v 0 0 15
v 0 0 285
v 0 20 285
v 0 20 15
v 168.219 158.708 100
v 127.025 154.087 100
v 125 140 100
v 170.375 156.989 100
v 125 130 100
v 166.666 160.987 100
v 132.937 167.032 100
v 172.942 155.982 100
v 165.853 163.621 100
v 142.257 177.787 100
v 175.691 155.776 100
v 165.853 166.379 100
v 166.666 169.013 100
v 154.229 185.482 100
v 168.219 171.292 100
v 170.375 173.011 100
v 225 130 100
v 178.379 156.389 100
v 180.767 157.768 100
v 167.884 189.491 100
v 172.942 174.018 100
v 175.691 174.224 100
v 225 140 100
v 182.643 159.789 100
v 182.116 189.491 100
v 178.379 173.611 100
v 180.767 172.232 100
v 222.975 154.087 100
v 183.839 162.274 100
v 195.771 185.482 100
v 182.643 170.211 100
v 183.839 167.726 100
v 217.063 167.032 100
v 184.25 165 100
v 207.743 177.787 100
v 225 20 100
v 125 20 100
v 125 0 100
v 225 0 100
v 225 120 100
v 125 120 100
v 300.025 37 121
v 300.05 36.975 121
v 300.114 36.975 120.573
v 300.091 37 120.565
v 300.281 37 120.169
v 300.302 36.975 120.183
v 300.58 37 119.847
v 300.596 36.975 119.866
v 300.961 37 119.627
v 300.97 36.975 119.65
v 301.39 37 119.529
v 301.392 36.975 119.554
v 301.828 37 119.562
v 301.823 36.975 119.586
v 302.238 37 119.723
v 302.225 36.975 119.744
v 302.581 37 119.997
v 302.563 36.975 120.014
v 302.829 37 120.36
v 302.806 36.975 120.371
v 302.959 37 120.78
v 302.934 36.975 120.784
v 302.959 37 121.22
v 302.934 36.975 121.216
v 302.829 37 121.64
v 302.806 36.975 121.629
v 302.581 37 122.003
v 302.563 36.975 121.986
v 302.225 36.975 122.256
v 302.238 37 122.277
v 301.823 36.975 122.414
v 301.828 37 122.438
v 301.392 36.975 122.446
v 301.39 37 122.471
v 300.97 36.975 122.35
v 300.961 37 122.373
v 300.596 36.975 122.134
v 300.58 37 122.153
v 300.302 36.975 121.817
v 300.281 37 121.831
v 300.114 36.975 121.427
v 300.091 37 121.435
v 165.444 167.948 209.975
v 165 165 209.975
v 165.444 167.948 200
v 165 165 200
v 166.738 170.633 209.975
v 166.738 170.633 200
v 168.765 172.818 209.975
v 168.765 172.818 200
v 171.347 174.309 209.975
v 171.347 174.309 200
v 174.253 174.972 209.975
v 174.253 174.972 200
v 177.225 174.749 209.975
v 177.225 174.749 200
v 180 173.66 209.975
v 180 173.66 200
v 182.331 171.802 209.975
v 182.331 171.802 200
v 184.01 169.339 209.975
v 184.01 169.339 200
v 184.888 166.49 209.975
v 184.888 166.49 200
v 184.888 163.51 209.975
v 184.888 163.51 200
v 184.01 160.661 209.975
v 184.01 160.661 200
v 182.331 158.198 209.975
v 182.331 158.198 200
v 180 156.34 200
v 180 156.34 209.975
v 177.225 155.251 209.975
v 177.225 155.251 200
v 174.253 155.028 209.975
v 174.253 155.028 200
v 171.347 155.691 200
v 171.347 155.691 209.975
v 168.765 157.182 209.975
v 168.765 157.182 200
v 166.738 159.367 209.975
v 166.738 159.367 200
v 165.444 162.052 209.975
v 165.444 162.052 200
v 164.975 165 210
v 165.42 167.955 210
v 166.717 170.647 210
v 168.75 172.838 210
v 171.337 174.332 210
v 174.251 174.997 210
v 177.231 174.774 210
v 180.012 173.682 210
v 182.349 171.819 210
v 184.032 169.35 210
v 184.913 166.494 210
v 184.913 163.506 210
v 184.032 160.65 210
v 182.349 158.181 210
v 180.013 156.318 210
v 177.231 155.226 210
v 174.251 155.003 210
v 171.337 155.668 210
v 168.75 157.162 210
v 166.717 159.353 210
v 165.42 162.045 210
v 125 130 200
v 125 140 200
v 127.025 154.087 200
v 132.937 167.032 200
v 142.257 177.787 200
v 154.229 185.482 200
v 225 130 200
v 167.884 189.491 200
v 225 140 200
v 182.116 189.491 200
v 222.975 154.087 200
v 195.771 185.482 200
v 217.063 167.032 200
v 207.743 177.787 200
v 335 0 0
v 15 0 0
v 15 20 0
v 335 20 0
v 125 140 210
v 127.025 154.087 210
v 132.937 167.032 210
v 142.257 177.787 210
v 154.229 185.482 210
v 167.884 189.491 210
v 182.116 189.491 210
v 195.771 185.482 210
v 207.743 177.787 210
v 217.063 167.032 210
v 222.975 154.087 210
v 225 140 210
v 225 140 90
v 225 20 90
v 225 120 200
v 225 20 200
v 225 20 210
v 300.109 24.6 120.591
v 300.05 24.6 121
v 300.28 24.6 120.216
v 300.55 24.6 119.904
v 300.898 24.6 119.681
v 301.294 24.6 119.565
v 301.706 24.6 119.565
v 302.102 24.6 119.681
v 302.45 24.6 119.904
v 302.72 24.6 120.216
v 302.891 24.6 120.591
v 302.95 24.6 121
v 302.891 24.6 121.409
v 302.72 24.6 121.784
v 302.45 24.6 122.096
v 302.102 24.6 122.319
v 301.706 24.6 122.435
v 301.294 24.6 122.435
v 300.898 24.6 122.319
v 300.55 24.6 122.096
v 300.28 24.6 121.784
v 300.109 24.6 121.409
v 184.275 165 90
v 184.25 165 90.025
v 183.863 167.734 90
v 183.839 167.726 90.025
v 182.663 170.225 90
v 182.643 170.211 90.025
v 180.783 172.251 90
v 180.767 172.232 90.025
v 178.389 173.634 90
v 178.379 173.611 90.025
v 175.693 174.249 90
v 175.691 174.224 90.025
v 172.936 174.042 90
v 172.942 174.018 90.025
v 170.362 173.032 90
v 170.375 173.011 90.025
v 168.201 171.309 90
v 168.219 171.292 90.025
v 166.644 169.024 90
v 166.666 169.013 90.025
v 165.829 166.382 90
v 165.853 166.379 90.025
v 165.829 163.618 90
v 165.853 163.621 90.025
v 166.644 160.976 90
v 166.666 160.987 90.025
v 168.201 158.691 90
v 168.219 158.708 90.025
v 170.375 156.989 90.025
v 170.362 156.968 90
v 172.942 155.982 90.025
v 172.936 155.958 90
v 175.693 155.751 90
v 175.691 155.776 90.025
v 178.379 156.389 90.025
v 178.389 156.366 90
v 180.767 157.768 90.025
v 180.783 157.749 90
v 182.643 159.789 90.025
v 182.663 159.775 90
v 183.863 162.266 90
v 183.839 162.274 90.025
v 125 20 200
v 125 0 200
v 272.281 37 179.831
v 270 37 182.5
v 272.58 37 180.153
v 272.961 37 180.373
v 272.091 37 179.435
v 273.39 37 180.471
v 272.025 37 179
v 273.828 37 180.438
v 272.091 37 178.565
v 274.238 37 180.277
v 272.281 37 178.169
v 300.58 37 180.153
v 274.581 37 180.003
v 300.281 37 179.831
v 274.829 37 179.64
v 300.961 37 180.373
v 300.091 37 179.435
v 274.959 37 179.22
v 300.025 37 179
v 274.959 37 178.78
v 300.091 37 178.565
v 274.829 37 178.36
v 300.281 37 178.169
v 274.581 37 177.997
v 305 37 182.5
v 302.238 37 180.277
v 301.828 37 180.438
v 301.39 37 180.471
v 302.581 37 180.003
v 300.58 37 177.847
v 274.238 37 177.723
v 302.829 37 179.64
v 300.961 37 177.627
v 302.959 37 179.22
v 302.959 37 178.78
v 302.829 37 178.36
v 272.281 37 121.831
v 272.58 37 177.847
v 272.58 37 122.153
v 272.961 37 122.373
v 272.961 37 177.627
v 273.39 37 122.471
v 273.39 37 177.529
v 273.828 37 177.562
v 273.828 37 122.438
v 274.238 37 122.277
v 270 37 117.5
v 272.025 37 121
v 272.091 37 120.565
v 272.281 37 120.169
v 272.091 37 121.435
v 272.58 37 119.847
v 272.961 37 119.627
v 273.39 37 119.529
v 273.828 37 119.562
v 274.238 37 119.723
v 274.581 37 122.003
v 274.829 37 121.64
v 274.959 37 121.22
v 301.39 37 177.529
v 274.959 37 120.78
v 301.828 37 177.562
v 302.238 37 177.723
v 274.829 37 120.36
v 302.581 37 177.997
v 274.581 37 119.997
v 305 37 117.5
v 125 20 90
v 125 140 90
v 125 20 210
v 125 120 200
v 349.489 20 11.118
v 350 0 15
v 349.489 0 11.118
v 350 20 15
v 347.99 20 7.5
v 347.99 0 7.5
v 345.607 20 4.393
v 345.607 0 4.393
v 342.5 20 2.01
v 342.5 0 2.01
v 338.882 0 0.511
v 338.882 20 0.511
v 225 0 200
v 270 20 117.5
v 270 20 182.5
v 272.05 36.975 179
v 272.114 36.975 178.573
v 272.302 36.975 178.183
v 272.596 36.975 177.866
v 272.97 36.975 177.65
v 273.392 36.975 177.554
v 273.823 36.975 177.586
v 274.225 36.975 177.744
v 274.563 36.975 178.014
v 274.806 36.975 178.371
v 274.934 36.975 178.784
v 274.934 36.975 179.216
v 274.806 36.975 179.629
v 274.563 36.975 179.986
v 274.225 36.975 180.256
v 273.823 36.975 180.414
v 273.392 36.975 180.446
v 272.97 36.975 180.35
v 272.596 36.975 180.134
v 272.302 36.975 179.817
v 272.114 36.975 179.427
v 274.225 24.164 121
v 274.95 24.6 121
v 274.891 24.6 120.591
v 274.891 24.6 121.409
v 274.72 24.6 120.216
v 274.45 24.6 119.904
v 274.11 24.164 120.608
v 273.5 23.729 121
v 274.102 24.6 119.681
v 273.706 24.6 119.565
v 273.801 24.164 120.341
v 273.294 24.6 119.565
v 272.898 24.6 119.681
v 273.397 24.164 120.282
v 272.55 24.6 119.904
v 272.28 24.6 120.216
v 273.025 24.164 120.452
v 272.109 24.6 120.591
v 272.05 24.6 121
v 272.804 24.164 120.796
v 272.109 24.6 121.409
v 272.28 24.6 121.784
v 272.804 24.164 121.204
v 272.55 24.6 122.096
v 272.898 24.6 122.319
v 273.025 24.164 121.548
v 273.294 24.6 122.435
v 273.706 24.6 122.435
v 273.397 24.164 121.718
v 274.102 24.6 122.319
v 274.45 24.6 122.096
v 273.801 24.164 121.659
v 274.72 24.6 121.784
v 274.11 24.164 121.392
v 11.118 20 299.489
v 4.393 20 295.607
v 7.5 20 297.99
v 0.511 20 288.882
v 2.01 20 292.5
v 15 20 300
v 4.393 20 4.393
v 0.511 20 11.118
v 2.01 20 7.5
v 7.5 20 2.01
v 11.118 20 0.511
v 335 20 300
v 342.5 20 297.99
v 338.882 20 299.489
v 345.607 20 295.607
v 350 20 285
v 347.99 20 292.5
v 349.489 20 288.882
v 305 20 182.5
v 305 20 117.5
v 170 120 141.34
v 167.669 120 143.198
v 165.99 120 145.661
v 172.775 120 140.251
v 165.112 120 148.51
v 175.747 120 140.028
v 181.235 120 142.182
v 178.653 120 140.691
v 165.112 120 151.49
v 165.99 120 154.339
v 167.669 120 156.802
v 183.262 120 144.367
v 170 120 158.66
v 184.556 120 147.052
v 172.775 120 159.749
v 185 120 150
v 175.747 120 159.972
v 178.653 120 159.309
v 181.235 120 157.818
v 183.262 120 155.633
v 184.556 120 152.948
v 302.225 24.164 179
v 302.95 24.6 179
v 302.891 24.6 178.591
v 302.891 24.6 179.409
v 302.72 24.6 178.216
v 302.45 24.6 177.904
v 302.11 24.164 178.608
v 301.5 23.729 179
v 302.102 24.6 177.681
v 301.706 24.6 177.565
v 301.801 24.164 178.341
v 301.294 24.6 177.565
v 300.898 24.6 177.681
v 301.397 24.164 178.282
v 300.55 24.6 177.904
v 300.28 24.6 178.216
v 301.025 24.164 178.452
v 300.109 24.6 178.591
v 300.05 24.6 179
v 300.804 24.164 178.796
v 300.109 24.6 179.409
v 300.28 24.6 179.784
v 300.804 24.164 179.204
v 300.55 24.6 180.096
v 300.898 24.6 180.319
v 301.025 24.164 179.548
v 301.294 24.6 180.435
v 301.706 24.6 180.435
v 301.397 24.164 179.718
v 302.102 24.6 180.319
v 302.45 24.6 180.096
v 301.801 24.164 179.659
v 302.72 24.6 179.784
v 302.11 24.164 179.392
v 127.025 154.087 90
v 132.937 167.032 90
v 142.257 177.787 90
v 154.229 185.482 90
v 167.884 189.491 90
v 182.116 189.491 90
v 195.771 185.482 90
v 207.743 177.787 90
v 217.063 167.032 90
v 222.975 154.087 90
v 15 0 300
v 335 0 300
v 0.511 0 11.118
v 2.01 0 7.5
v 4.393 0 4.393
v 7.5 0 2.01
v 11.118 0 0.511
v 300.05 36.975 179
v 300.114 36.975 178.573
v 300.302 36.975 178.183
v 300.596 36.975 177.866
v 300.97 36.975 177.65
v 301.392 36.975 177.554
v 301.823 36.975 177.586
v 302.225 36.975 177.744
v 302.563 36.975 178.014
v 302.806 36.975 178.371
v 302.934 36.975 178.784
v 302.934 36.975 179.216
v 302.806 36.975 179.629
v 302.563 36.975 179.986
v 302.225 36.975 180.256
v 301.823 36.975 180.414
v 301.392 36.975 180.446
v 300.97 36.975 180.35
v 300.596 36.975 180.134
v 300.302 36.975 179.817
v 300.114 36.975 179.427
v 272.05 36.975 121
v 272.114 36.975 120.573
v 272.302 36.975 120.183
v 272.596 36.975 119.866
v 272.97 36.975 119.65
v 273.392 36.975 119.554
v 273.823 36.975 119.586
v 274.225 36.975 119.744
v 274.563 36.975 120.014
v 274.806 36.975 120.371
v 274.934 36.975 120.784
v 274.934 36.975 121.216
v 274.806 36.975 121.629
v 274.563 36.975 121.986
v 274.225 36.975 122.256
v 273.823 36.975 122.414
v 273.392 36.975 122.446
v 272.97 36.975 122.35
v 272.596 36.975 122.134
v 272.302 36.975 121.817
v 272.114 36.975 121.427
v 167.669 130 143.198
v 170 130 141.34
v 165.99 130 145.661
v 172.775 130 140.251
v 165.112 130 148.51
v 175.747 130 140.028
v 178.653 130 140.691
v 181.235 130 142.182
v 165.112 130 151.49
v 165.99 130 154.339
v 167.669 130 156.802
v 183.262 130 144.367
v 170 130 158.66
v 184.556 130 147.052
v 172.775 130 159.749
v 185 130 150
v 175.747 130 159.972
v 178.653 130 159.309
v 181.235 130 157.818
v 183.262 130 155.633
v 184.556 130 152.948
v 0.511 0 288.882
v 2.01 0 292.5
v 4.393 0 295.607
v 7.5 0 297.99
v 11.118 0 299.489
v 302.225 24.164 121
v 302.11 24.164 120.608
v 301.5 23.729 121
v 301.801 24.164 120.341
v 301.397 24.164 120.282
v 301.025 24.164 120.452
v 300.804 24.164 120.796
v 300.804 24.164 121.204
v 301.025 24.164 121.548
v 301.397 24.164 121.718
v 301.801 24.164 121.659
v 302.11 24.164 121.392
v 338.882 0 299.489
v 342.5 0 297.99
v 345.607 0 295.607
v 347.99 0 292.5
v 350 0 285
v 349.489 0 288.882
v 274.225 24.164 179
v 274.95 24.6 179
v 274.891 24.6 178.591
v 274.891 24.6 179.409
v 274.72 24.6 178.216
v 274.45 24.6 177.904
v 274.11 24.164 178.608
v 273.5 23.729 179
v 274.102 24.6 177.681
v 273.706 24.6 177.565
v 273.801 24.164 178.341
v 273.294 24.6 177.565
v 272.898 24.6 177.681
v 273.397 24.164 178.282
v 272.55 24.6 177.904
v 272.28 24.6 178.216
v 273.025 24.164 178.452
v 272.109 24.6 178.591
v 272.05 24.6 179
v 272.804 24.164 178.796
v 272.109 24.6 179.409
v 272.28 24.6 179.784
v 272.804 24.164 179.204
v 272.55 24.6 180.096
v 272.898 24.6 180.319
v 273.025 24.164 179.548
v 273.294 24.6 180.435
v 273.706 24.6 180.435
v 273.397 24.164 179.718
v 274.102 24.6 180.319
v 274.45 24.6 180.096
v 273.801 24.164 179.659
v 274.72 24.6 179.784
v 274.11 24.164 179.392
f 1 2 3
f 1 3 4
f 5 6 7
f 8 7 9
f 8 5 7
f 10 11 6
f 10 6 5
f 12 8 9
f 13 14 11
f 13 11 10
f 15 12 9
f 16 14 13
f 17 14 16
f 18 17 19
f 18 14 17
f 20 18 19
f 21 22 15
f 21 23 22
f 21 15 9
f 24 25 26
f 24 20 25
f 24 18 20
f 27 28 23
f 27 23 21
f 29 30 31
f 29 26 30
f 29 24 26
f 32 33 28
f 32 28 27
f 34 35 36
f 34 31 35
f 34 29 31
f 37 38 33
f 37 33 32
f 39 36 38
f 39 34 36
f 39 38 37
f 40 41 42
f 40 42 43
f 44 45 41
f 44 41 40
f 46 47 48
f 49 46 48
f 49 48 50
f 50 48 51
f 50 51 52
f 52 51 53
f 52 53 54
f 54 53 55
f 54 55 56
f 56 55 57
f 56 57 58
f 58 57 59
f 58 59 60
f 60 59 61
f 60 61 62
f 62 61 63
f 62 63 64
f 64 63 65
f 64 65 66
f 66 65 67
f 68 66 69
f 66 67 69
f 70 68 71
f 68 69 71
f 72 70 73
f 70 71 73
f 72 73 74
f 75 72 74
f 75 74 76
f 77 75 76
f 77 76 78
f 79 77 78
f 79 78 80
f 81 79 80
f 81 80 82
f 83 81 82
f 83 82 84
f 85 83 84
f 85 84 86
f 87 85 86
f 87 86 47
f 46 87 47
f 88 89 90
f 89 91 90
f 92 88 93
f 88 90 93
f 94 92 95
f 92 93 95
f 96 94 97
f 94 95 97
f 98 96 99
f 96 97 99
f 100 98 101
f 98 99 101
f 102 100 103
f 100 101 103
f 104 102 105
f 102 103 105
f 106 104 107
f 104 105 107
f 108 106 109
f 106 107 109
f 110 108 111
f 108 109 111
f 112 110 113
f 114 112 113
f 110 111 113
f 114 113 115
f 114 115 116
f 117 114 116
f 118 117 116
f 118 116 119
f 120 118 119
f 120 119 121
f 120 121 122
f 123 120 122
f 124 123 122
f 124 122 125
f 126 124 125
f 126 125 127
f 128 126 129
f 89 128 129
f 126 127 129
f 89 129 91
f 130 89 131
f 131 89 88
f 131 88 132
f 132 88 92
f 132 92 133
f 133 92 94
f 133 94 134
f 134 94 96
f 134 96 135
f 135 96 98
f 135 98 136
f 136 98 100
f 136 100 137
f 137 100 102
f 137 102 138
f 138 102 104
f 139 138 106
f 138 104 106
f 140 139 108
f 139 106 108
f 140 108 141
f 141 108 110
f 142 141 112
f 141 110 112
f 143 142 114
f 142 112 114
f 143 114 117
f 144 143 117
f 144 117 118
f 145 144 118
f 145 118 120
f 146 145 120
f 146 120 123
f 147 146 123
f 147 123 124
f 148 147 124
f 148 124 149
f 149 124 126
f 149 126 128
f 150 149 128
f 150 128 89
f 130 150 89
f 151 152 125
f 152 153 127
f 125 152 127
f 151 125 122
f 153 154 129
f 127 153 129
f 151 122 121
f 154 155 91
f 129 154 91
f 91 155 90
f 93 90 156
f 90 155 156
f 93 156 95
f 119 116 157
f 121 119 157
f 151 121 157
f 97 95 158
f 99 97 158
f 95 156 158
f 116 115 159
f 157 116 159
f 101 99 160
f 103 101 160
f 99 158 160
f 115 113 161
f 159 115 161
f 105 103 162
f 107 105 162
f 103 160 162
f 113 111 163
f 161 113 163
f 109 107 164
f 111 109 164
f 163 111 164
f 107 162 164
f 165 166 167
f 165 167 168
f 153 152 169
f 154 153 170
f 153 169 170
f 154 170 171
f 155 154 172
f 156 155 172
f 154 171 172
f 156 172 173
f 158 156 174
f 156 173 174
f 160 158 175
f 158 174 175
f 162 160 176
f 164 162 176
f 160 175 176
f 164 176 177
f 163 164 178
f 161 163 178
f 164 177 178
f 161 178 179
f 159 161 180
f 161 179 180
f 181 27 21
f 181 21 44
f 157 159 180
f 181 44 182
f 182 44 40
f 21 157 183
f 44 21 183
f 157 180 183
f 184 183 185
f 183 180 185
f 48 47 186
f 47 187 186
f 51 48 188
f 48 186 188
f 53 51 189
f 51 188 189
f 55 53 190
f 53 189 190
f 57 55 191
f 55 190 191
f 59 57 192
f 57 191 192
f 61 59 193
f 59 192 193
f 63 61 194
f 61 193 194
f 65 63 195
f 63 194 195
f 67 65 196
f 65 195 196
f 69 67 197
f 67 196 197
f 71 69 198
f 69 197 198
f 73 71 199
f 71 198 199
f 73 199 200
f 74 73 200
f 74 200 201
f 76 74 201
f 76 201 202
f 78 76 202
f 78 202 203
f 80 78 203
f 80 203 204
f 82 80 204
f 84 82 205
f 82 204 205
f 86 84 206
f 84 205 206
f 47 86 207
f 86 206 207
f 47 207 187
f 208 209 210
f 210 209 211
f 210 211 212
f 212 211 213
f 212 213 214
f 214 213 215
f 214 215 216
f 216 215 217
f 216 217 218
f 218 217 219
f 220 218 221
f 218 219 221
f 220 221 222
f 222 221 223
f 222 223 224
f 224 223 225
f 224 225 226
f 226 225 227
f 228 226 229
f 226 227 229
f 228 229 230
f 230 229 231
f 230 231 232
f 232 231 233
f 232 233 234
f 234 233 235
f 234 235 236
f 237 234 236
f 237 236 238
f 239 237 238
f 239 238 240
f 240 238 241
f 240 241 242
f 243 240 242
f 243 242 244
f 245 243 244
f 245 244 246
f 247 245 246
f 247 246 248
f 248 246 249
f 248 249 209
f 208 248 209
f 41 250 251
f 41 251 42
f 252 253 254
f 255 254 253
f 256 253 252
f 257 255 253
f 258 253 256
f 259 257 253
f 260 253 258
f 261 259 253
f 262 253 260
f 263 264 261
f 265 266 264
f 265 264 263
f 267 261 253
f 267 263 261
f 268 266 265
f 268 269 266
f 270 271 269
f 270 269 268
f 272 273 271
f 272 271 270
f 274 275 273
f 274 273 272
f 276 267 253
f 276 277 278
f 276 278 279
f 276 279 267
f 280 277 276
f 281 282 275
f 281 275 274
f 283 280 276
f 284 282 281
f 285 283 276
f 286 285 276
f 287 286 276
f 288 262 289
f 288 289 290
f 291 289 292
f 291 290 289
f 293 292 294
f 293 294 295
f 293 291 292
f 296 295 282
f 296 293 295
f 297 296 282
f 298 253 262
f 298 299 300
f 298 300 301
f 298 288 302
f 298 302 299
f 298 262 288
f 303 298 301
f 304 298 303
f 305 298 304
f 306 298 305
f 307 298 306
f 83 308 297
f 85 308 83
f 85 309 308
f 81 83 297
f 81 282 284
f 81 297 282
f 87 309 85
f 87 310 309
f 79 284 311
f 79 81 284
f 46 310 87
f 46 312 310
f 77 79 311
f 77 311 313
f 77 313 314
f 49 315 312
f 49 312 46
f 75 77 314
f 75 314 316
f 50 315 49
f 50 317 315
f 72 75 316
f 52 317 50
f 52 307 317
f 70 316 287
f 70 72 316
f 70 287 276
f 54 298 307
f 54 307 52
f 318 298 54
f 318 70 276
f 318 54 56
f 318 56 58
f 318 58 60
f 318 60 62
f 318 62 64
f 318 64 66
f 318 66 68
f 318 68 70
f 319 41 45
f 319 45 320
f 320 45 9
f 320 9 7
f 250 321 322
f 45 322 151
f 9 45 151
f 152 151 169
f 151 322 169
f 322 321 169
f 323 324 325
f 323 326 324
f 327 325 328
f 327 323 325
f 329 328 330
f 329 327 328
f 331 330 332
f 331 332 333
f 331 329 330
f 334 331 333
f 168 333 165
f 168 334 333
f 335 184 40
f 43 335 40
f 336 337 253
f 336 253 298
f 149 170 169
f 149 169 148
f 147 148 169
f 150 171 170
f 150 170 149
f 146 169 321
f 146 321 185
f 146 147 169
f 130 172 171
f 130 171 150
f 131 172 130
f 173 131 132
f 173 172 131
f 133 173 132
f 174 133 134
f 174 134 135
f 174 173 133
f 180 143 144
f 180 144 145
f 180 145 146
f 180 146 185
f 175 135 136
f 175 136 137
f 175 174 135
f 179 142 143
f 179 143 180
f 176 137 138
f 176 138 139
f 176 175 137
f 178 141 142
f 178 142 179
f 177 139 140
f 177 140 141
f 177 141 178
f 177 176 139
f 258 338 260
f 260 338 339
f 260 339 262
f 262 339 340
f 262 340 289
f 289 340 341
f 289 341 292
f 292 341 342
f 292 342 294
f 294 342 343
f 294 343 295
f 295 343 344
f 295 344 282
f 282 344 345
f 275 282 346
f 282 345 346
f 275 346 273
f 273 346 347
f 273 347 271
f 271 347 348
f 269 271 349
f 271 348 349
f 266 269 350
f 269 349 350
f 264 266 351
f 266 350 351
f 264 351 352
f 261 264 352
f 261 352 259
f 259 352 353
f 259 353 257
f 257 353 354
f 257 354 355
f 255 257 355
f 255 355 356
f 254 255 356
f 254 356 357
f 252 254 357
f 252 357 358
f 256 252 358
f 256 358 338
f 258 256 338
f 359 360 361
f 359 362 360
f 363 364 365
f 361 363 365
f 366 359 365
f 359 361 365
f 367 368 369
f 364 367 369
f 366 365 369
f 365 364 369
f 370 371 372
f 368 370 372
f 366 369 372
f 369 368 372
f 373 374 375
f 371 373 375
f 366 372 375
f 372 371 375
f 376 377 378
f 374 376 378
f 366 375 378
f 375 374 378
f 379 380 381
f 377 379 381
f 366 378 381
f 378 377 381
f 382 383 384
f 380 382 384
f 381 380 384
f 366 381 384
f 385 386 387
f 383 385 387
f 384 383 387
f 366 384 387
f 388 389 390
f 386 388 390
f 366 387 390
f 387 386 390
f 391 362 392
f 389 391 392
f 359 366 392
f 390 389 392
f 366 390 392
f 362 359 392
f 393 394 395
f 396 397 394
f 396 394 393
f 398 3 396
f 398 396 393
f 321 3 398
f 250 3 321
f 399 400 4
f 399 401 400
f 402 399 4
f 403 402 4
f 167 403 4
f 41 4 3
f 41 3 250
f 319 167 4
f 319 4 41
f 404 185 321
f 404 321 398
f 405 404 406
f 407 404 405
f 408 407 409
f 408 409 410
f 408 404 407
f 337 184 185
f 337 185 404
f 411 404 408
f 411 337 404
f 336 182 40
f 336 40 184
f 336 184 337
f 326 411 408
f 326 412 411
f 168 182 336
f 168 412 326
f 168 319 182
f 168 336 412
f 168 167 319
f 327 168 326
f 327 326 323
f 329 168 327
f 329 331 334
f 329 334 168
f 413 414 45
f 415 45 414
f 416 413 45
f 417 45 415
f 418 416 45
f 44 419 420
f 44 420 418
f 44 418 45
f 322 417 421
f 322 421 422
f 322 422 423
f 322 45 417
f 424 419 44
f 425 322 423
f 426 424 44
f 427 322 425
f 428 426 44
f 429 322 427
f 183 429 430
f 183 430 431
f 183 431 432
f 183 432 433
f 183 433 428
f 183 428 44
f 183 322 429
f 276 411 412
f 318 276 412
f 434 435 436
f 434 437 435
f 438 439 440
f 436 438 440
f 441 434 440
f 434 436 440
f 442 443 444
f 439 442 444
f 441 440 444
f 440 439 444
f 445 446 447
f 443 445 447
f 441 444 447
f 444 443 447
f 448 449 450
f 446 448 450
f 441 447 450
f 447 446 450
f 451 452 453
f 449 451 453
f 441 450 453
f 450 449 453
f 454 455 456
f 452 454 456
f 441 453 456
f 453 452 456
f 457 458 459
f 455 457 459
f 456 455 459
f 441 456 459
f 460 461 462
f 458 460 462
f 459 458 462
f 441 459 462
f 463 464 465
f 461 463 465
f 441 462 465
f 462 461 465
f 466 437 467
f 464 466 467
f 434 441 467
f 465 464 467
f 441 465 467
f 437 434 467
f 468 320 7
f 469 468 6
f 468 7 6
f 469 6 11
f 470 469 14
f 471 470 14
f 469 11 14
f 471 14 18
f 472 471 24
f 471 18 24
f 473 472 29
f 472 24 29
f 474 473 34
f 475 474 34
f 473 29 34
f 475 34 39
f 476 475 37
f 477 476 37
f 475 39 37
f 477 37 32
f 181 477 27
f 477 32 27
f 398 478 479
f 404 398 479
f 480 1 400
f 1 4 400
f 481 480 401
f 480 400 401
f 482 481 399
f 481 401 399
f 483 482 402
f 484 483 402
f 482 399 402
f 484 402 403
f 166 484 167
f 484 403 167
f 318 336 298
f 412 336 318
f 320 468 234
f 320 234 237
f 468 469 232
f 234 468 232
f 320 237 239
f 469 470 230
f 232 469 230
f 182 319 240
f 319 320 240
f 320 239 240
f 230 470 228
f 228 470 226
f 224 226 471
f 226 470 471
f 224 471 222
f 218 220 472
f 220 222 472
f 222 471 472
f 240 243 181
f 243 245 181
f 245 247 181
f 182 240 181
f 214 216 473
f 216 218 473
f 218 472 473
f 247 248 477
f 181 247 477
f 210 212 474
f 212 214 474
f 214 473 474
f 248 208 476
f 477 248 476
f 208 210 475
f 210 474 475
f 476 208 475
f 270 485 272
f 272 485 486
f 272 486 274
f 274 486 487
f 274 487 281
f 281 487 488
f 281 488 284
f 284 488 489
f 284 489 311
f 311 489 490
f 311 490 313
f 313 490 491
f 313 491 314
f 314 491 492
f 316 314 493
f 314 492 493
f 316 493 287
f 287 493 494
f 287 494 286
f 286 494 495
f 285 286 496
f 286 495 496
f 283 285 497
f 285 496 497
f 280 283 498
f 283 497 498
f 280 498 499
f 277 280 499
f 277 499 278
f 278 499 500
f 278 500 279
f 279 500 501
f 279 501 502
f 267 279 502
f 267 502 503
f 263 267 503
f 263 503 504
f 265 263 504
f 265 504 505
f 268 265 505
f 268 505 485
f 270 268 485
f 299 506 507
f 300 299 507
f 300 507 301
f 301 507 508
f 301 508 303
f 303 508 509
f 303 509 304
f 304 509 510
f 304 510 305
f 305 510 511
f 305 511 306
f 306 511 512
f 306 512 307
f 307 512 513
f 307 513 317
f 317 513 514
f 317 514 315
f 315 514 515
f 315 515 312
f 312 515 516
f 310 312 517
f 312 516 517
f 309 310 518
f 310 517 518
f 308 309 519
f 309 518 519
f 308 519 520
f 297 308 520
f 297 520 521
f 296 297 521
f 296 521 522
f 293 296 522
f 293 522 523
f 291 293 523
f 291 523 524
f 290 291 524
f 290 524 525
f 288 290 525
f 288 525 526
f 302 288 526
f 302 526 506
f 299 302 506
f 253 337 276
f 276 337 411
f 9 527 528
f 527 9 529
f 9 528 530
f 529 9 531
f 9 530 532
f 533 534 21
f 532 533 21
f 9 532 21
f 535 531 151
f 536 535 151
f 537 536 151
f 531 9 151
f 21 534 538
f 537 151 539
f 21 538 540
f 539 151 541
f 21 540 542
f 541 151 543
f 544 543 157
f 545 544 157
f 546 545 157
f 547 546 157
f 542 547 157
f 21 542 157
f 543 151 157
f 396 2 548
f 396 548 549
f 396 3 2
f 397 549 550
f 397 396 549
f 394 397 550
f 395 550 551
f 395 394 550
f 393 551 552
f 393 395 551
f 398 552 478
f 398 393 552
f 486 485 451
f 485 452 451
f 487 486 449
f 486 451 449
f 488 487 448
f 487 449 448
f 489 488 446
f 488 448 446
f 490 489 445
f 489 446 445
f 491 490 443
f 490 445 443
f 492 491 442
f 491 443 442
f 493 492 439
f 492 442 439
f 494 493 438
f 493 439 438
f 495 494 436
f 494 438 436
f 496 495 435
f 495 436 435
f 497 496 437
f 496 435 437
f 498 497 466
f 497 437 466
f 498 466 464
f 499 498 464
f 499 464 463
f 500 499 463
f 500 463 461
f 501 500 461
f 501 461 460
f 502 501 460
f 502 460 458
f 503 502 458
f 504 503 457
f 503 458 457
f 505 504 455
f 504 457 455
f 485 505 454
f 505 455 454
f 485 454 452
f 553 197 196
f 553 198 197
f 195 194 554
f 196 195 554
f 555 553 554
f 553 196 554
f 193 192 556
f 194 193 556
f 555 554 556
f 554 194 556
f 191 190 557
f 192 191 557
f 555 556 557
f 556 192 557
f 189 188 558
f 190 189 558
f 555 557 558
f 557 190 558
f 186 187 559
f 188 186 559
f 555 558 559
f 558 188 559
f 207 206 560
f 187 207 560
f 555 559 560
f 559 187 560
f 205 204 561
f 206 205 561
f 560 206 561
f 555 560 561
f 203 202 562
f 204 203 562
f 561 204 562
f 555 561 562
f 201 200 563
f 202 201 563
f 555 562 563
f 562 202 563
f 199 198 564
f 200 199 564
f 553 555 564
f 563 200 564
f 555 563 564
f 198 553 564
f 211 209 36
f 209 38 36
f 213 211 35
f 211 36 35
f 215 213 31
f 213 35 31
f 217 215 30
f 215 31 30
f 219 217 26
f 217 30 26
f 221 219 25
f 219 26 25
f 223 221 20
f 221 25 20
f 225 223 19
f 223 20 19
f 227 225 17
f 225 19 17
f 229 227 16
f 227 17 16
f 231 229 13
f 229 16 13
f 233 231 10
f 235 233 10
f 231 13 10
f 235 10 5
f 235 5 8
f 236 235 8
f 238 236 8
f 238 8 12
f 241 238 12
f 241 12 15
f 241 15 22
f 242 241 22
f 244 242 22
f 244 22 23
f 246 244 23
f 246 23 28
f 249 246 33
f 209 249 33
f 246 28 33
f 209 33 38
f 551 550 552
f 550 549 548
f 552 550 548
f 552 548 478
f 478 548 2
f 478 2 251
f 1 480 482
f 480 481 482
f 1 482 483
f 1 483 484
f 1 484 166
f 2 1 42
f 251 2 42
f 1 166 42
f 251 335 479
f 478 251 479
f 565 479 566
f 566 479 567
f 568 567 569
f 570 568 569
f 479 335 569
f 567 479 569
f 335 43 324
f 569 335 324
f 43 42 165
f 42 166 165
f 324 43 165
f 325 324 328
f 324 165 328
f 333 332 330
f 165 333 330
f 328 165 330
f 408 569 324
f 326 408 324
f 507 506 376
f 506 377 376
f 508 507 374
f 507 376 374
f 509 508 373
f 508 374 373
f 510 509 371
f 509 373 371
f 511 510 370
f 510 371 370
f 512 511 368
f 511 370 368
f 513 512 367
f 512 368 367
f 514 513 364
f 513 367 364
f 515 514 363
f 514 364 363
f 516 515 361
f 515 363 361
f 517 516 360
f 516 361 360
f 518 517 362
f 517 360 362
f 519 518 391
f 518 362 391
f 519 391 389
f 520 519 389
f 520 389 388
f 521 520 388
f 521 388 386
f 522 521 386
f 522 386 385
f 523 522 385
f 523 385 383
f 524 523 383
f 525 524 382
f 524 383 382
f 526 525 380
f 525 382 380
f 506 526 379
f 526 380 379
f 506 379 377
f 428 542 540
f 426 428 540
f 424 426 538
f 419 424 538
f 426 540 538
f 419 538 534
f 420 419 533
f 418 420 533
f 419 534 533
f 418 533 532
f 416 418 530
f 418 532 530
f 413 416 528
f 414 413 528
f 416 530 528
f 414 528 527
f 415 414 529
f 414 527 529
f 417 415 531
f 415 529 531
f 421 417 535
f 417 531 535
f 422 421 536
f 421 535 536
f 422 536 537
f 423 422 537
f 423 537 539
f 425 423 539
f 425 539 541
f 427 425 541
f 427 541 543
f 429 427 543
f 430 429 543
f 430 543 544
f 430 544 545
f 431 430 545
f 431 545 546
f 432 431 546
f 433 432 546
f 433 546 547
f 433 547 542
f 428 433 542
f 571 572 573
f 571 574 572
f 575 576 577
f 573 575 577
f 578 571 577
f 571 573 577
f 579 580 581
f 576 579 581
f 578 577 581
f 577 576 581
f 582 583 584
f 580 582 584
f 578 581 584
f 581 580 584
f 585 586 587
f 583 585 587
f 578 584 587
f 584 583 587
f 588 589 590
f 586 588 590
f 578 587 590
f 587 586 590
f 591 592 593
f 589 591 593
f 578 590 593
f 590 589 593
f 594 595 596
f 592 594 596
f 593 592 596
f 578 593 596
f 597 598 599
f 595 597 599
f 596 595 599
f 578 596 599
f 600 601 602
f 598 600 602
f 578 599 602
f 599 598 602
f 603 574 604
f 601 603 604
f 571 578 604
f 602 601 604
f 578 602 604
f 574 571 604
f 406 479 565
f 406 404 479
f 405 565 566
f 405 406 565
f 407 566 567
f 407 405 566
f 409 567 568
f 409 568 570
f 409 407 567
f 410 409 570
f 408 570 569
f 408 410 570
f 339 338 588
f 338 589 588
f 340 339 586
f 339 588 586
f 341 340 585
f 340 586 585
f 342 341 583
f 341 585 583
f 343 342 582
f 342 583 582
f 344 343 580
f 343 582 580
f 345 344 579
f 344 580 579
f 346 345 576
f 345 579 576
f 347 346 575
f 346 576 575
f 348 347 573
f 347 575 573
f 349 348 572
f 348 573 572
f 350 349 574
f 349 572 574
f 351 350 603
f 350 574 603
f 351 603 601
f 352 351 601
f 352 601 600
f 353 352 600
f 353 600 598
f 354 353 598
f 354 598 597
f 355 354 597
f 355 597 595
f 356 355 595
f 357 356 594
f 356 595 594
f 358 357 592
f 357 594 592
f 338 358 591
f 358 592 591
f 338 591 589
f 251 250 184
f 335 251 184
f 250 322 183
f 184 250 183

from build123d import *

# Parameters (mm, degrees)
SKETCH1_W                              = 350
SKETCH1_H                              = 300
BOSS_EXTRUDE1_DEPTH                    = 20
FILLET1_R                              = 15
SKETCH2_W                              = 100
SKETCH2_H                              = 100
CUT_EXTRUDE1_DEPTH                     = 20
BOSS_EXTRUDE2_DEPTH                    = 10
LPATTERN1_COUNT                        = 2
LPATTERN1_PITCH                        = 110
F_20_0_20_DIAMETER_HOLE2_D             = 20
F_20_0_20_DIAMETER_HOLE2_DEPTH         = 10
F_20_0_20_DIAMETER_HOLE2_CSINK_D       = 20.05
F_20_0_20_DIAMETER_HOLE2_CSINK_ANGLE   = 90
F_20_0_20_DIAMETER_HOLE2_TIP           = 6.00860619
F_18_5_18_5_DIAMETER_HOLE1_D           = 18.5
F_18_5_18_5_DIAMETER_HOLE1_DEPTH       = 10
F_18_5_18_5_DIAMETER_HOLE1_CSINK_D     = 18.55
F_18_5_18_5_DIAMETER_HOLE1_CSINK_ANGLE = 90
F_18_5_18_5_DIAMETER_HOLE1_TIP         = 5.557960726
SKETCH32_W                             = 100
SKETCH32_H                             = 10
BOSS_EXTRUDE3_DEPTH                    = 120
SKETCH37_R                             = 10
CUT_EXTRUDE2_DEPTH                     = 36.07831716
SKETCH45_W                             = 35
SKETCH45_H                             = 65
BOSS_EXTRUDE4_DEPTH                    = 17
M2_5_CLEARANCE_HOLE1_D                 = 2.9
M2_5_CLEARANCE_HOLE1_DEPTH             = 12.4
M2_5_CLEARANCE_HOLE1_CSINK_D           = 2.95
M2_5_CLEARANCE_HOLE1_CSINK_ANGLE       = 90
M2_5_CLEARANCE_HOLE1_TIP               = 0.871247898


with BuildPart() as part:
    # Sketch1 → Boss-Extrude1 (new body)
    with BuildSketch(Plane(origin=(0, 0, 0), x_dir=(1, 0, 0), z_dir=(0, 1, 0))):
        with Locations((175, -150)):
            Rectangle(SKETCH1_W, SKETCH1_H)
    extrude(amount=BOSS_EXTRUDE1_DEPTH)

    # Fillet1
    fillet1_edges = [part.edges().sort_by_distance(p)[0] for p in [
        (0, 10, 0),
        (350, 10, 0),
        (350, 10, 300),
        (0, 10, 300),
    ]]
    fillet(fillet1_edges, radius=FILLET1_R)

    # Sketch2 → Cut-Extrude1 (cut)
    with BuildSketch(Plane(origin=(0, 20, 0), x_dir=(1, 0, 0), z_dir=(0, 1, 0))):
        with Locations((175, -150)):
            Rectangle(SKETCH2_W, SKETCH2_H)
    extrude(amount=-CUT_EXTRUDE1_DEPTH, mode=Mode.SUBTRACT)

    # Sketch6 → Boss-Extrude2 (add)
    with BuildSketch(Plane.XY.offset(100)):
        with BuildLine():
            Line((125, 0), (125, 140))
            ThreePointArc((125, 140), (175, 190), (225, 140))
            Line((225, 140), (225, 0))
            Line((225, 0), (125, 0))
        make_face()
    boss_extrude2 = extrude(amount=-BOSS_EXTRUDE2_DEPTH)

    # LPattern1: Boss-Extrude2 ×2
    with Locations(*[(0, 0, i * LPATTERN1_PITCH) for i in range(1, LPATTERN1_COUNT)]):
        add(boss_extrude2)

    # Ø20.0 (20) Diameter Hole2
    with Locations(Plane.XY.offset(210)):
        with Locations((175, 165)):
            CounterSinkHole(F_20_0_20_DIAMETER_HOLE2_D / 2, F_20_0_20_DIAMETER_HOLE2_CSINK_D / 2, depth=F_20_0_20_DIAMETER_HOLE2_DEPTH, counter_sink_angle=F_20_0_20_DIAMETER_HOLE2_CSINK_ANGLE)
            with Locations((0, 0, -(F_20_0_20_DIAMETER_HOLE2_DEPTH + F_20_0_20_DIAMETER_HOLE2_TIP / 2))):  # 118° drill point
                Cone(0, F_20_0_20_DIAMETER_HOLE2_D / 2, F_20_0_20_DIAMETER_HOLE2_TIP, mode=Mode.SUBTRACT)

    # Ø18.5 (18.5) Diameter Hole1
    with Locations(Plane(origin=(0, 0, 90), x_dir=(-1, 0, 0), z_dir=(0, 0, -1))):
        with Locations((-175, 165)):
            CounterSinkHole(F_18_5_18_5_DIAMETER_HOLE1_D / 2, F_18_5_18_5_DIAMETER_HOLE1_CSINK_D / 2, depth=F_18_5_18_5_DIAMETER_HOLE1_DEPTH, counter_sink_angle=F_18_5_18_5_DIAMETER_HOLE1_CSINK_ANGLE)
            with Locations((0, 0, -(F_18_5_18_5_DIAMETER_HOLE1_DEPTH + F_18_5_18_5_DIAMETER_HOLE1_TIP / 2))):  # 118° drill point
                Cone(0, F_18_5_18_5_DIAMETER_HOLE1_D / 2, F_18_5_18_5_DIAMETER_HOLE1_TIP, mode=Mode.SUBTRACT)

    # Sketch32 → Boss-Extrude3 (add)
    with BuildSketch(Plane.XY.offset(210)):
        with Locations((175, 125)):
            Rectangle(SKETCH32_W, SKETCH32_H)
    extrude(amount=-BOSS_EXTRUDE3_DEPTH)

    # Sketch37 → Cut-Extrude2 (cut)
    with BuildSketch(Plane(origin=(0, 130, 0), x_dir=(1, 0, 0), z_dir=(0, 1, 0))):
        with Locations((175, -150)):
            Circle(SKETCH37_R)
    extrude(amount=-CUT_EXTRUDE2_DEPTH, mode=Mode.SUBTRACT)

    # Sketch45 → Boss-Extrude4 (add)
    with BuildSketch(Plane(origin=(0, 20, 0), x_dir=(1, 0, 0), z_dir=(0, 1, 0))):
        with Locations((287.5, -150)):
            Rectangle(SKETCH45_W, SKETCH45_H)
    extrude(amount=BOSS_EXTRUDE4_DEPTH)

    # M2.5 Clearance Hole1
    with Locations(Plane(origin=(0, 37, 0), x_dir=(1, 0, 0), z_dir=(0, 1, 0))):
        with Locations((273.5, -121), (301.5, -121), (301.5, -179), (273.5, -179)):
            CounterSinkHole(M2_5_CLEARANCE_HOLE1_D / 2, M2_5_CLEARANCE_HOLE1_CSINK_D / 2, depth=M2_5_CLEARANCE_HOLE1_DEPTH, counter_sink_angle=M2_5_CLEARANCE_HOLE1_CSINK_ANGLE)
            with Locations((0, 0, -(M2_5_CLEARANCE_HOLE1_DEPTH + M2_5_CLEARANCE_HOLE1_TIP / 2))):  # 118° drill point
                Cone(0, M2_5_CLEARANCE_HOLE1_D / 2, M2_5_CLEARANCE_HOLE1_TIP, mode=Mode.SUBTRACT)


solid = part.part
